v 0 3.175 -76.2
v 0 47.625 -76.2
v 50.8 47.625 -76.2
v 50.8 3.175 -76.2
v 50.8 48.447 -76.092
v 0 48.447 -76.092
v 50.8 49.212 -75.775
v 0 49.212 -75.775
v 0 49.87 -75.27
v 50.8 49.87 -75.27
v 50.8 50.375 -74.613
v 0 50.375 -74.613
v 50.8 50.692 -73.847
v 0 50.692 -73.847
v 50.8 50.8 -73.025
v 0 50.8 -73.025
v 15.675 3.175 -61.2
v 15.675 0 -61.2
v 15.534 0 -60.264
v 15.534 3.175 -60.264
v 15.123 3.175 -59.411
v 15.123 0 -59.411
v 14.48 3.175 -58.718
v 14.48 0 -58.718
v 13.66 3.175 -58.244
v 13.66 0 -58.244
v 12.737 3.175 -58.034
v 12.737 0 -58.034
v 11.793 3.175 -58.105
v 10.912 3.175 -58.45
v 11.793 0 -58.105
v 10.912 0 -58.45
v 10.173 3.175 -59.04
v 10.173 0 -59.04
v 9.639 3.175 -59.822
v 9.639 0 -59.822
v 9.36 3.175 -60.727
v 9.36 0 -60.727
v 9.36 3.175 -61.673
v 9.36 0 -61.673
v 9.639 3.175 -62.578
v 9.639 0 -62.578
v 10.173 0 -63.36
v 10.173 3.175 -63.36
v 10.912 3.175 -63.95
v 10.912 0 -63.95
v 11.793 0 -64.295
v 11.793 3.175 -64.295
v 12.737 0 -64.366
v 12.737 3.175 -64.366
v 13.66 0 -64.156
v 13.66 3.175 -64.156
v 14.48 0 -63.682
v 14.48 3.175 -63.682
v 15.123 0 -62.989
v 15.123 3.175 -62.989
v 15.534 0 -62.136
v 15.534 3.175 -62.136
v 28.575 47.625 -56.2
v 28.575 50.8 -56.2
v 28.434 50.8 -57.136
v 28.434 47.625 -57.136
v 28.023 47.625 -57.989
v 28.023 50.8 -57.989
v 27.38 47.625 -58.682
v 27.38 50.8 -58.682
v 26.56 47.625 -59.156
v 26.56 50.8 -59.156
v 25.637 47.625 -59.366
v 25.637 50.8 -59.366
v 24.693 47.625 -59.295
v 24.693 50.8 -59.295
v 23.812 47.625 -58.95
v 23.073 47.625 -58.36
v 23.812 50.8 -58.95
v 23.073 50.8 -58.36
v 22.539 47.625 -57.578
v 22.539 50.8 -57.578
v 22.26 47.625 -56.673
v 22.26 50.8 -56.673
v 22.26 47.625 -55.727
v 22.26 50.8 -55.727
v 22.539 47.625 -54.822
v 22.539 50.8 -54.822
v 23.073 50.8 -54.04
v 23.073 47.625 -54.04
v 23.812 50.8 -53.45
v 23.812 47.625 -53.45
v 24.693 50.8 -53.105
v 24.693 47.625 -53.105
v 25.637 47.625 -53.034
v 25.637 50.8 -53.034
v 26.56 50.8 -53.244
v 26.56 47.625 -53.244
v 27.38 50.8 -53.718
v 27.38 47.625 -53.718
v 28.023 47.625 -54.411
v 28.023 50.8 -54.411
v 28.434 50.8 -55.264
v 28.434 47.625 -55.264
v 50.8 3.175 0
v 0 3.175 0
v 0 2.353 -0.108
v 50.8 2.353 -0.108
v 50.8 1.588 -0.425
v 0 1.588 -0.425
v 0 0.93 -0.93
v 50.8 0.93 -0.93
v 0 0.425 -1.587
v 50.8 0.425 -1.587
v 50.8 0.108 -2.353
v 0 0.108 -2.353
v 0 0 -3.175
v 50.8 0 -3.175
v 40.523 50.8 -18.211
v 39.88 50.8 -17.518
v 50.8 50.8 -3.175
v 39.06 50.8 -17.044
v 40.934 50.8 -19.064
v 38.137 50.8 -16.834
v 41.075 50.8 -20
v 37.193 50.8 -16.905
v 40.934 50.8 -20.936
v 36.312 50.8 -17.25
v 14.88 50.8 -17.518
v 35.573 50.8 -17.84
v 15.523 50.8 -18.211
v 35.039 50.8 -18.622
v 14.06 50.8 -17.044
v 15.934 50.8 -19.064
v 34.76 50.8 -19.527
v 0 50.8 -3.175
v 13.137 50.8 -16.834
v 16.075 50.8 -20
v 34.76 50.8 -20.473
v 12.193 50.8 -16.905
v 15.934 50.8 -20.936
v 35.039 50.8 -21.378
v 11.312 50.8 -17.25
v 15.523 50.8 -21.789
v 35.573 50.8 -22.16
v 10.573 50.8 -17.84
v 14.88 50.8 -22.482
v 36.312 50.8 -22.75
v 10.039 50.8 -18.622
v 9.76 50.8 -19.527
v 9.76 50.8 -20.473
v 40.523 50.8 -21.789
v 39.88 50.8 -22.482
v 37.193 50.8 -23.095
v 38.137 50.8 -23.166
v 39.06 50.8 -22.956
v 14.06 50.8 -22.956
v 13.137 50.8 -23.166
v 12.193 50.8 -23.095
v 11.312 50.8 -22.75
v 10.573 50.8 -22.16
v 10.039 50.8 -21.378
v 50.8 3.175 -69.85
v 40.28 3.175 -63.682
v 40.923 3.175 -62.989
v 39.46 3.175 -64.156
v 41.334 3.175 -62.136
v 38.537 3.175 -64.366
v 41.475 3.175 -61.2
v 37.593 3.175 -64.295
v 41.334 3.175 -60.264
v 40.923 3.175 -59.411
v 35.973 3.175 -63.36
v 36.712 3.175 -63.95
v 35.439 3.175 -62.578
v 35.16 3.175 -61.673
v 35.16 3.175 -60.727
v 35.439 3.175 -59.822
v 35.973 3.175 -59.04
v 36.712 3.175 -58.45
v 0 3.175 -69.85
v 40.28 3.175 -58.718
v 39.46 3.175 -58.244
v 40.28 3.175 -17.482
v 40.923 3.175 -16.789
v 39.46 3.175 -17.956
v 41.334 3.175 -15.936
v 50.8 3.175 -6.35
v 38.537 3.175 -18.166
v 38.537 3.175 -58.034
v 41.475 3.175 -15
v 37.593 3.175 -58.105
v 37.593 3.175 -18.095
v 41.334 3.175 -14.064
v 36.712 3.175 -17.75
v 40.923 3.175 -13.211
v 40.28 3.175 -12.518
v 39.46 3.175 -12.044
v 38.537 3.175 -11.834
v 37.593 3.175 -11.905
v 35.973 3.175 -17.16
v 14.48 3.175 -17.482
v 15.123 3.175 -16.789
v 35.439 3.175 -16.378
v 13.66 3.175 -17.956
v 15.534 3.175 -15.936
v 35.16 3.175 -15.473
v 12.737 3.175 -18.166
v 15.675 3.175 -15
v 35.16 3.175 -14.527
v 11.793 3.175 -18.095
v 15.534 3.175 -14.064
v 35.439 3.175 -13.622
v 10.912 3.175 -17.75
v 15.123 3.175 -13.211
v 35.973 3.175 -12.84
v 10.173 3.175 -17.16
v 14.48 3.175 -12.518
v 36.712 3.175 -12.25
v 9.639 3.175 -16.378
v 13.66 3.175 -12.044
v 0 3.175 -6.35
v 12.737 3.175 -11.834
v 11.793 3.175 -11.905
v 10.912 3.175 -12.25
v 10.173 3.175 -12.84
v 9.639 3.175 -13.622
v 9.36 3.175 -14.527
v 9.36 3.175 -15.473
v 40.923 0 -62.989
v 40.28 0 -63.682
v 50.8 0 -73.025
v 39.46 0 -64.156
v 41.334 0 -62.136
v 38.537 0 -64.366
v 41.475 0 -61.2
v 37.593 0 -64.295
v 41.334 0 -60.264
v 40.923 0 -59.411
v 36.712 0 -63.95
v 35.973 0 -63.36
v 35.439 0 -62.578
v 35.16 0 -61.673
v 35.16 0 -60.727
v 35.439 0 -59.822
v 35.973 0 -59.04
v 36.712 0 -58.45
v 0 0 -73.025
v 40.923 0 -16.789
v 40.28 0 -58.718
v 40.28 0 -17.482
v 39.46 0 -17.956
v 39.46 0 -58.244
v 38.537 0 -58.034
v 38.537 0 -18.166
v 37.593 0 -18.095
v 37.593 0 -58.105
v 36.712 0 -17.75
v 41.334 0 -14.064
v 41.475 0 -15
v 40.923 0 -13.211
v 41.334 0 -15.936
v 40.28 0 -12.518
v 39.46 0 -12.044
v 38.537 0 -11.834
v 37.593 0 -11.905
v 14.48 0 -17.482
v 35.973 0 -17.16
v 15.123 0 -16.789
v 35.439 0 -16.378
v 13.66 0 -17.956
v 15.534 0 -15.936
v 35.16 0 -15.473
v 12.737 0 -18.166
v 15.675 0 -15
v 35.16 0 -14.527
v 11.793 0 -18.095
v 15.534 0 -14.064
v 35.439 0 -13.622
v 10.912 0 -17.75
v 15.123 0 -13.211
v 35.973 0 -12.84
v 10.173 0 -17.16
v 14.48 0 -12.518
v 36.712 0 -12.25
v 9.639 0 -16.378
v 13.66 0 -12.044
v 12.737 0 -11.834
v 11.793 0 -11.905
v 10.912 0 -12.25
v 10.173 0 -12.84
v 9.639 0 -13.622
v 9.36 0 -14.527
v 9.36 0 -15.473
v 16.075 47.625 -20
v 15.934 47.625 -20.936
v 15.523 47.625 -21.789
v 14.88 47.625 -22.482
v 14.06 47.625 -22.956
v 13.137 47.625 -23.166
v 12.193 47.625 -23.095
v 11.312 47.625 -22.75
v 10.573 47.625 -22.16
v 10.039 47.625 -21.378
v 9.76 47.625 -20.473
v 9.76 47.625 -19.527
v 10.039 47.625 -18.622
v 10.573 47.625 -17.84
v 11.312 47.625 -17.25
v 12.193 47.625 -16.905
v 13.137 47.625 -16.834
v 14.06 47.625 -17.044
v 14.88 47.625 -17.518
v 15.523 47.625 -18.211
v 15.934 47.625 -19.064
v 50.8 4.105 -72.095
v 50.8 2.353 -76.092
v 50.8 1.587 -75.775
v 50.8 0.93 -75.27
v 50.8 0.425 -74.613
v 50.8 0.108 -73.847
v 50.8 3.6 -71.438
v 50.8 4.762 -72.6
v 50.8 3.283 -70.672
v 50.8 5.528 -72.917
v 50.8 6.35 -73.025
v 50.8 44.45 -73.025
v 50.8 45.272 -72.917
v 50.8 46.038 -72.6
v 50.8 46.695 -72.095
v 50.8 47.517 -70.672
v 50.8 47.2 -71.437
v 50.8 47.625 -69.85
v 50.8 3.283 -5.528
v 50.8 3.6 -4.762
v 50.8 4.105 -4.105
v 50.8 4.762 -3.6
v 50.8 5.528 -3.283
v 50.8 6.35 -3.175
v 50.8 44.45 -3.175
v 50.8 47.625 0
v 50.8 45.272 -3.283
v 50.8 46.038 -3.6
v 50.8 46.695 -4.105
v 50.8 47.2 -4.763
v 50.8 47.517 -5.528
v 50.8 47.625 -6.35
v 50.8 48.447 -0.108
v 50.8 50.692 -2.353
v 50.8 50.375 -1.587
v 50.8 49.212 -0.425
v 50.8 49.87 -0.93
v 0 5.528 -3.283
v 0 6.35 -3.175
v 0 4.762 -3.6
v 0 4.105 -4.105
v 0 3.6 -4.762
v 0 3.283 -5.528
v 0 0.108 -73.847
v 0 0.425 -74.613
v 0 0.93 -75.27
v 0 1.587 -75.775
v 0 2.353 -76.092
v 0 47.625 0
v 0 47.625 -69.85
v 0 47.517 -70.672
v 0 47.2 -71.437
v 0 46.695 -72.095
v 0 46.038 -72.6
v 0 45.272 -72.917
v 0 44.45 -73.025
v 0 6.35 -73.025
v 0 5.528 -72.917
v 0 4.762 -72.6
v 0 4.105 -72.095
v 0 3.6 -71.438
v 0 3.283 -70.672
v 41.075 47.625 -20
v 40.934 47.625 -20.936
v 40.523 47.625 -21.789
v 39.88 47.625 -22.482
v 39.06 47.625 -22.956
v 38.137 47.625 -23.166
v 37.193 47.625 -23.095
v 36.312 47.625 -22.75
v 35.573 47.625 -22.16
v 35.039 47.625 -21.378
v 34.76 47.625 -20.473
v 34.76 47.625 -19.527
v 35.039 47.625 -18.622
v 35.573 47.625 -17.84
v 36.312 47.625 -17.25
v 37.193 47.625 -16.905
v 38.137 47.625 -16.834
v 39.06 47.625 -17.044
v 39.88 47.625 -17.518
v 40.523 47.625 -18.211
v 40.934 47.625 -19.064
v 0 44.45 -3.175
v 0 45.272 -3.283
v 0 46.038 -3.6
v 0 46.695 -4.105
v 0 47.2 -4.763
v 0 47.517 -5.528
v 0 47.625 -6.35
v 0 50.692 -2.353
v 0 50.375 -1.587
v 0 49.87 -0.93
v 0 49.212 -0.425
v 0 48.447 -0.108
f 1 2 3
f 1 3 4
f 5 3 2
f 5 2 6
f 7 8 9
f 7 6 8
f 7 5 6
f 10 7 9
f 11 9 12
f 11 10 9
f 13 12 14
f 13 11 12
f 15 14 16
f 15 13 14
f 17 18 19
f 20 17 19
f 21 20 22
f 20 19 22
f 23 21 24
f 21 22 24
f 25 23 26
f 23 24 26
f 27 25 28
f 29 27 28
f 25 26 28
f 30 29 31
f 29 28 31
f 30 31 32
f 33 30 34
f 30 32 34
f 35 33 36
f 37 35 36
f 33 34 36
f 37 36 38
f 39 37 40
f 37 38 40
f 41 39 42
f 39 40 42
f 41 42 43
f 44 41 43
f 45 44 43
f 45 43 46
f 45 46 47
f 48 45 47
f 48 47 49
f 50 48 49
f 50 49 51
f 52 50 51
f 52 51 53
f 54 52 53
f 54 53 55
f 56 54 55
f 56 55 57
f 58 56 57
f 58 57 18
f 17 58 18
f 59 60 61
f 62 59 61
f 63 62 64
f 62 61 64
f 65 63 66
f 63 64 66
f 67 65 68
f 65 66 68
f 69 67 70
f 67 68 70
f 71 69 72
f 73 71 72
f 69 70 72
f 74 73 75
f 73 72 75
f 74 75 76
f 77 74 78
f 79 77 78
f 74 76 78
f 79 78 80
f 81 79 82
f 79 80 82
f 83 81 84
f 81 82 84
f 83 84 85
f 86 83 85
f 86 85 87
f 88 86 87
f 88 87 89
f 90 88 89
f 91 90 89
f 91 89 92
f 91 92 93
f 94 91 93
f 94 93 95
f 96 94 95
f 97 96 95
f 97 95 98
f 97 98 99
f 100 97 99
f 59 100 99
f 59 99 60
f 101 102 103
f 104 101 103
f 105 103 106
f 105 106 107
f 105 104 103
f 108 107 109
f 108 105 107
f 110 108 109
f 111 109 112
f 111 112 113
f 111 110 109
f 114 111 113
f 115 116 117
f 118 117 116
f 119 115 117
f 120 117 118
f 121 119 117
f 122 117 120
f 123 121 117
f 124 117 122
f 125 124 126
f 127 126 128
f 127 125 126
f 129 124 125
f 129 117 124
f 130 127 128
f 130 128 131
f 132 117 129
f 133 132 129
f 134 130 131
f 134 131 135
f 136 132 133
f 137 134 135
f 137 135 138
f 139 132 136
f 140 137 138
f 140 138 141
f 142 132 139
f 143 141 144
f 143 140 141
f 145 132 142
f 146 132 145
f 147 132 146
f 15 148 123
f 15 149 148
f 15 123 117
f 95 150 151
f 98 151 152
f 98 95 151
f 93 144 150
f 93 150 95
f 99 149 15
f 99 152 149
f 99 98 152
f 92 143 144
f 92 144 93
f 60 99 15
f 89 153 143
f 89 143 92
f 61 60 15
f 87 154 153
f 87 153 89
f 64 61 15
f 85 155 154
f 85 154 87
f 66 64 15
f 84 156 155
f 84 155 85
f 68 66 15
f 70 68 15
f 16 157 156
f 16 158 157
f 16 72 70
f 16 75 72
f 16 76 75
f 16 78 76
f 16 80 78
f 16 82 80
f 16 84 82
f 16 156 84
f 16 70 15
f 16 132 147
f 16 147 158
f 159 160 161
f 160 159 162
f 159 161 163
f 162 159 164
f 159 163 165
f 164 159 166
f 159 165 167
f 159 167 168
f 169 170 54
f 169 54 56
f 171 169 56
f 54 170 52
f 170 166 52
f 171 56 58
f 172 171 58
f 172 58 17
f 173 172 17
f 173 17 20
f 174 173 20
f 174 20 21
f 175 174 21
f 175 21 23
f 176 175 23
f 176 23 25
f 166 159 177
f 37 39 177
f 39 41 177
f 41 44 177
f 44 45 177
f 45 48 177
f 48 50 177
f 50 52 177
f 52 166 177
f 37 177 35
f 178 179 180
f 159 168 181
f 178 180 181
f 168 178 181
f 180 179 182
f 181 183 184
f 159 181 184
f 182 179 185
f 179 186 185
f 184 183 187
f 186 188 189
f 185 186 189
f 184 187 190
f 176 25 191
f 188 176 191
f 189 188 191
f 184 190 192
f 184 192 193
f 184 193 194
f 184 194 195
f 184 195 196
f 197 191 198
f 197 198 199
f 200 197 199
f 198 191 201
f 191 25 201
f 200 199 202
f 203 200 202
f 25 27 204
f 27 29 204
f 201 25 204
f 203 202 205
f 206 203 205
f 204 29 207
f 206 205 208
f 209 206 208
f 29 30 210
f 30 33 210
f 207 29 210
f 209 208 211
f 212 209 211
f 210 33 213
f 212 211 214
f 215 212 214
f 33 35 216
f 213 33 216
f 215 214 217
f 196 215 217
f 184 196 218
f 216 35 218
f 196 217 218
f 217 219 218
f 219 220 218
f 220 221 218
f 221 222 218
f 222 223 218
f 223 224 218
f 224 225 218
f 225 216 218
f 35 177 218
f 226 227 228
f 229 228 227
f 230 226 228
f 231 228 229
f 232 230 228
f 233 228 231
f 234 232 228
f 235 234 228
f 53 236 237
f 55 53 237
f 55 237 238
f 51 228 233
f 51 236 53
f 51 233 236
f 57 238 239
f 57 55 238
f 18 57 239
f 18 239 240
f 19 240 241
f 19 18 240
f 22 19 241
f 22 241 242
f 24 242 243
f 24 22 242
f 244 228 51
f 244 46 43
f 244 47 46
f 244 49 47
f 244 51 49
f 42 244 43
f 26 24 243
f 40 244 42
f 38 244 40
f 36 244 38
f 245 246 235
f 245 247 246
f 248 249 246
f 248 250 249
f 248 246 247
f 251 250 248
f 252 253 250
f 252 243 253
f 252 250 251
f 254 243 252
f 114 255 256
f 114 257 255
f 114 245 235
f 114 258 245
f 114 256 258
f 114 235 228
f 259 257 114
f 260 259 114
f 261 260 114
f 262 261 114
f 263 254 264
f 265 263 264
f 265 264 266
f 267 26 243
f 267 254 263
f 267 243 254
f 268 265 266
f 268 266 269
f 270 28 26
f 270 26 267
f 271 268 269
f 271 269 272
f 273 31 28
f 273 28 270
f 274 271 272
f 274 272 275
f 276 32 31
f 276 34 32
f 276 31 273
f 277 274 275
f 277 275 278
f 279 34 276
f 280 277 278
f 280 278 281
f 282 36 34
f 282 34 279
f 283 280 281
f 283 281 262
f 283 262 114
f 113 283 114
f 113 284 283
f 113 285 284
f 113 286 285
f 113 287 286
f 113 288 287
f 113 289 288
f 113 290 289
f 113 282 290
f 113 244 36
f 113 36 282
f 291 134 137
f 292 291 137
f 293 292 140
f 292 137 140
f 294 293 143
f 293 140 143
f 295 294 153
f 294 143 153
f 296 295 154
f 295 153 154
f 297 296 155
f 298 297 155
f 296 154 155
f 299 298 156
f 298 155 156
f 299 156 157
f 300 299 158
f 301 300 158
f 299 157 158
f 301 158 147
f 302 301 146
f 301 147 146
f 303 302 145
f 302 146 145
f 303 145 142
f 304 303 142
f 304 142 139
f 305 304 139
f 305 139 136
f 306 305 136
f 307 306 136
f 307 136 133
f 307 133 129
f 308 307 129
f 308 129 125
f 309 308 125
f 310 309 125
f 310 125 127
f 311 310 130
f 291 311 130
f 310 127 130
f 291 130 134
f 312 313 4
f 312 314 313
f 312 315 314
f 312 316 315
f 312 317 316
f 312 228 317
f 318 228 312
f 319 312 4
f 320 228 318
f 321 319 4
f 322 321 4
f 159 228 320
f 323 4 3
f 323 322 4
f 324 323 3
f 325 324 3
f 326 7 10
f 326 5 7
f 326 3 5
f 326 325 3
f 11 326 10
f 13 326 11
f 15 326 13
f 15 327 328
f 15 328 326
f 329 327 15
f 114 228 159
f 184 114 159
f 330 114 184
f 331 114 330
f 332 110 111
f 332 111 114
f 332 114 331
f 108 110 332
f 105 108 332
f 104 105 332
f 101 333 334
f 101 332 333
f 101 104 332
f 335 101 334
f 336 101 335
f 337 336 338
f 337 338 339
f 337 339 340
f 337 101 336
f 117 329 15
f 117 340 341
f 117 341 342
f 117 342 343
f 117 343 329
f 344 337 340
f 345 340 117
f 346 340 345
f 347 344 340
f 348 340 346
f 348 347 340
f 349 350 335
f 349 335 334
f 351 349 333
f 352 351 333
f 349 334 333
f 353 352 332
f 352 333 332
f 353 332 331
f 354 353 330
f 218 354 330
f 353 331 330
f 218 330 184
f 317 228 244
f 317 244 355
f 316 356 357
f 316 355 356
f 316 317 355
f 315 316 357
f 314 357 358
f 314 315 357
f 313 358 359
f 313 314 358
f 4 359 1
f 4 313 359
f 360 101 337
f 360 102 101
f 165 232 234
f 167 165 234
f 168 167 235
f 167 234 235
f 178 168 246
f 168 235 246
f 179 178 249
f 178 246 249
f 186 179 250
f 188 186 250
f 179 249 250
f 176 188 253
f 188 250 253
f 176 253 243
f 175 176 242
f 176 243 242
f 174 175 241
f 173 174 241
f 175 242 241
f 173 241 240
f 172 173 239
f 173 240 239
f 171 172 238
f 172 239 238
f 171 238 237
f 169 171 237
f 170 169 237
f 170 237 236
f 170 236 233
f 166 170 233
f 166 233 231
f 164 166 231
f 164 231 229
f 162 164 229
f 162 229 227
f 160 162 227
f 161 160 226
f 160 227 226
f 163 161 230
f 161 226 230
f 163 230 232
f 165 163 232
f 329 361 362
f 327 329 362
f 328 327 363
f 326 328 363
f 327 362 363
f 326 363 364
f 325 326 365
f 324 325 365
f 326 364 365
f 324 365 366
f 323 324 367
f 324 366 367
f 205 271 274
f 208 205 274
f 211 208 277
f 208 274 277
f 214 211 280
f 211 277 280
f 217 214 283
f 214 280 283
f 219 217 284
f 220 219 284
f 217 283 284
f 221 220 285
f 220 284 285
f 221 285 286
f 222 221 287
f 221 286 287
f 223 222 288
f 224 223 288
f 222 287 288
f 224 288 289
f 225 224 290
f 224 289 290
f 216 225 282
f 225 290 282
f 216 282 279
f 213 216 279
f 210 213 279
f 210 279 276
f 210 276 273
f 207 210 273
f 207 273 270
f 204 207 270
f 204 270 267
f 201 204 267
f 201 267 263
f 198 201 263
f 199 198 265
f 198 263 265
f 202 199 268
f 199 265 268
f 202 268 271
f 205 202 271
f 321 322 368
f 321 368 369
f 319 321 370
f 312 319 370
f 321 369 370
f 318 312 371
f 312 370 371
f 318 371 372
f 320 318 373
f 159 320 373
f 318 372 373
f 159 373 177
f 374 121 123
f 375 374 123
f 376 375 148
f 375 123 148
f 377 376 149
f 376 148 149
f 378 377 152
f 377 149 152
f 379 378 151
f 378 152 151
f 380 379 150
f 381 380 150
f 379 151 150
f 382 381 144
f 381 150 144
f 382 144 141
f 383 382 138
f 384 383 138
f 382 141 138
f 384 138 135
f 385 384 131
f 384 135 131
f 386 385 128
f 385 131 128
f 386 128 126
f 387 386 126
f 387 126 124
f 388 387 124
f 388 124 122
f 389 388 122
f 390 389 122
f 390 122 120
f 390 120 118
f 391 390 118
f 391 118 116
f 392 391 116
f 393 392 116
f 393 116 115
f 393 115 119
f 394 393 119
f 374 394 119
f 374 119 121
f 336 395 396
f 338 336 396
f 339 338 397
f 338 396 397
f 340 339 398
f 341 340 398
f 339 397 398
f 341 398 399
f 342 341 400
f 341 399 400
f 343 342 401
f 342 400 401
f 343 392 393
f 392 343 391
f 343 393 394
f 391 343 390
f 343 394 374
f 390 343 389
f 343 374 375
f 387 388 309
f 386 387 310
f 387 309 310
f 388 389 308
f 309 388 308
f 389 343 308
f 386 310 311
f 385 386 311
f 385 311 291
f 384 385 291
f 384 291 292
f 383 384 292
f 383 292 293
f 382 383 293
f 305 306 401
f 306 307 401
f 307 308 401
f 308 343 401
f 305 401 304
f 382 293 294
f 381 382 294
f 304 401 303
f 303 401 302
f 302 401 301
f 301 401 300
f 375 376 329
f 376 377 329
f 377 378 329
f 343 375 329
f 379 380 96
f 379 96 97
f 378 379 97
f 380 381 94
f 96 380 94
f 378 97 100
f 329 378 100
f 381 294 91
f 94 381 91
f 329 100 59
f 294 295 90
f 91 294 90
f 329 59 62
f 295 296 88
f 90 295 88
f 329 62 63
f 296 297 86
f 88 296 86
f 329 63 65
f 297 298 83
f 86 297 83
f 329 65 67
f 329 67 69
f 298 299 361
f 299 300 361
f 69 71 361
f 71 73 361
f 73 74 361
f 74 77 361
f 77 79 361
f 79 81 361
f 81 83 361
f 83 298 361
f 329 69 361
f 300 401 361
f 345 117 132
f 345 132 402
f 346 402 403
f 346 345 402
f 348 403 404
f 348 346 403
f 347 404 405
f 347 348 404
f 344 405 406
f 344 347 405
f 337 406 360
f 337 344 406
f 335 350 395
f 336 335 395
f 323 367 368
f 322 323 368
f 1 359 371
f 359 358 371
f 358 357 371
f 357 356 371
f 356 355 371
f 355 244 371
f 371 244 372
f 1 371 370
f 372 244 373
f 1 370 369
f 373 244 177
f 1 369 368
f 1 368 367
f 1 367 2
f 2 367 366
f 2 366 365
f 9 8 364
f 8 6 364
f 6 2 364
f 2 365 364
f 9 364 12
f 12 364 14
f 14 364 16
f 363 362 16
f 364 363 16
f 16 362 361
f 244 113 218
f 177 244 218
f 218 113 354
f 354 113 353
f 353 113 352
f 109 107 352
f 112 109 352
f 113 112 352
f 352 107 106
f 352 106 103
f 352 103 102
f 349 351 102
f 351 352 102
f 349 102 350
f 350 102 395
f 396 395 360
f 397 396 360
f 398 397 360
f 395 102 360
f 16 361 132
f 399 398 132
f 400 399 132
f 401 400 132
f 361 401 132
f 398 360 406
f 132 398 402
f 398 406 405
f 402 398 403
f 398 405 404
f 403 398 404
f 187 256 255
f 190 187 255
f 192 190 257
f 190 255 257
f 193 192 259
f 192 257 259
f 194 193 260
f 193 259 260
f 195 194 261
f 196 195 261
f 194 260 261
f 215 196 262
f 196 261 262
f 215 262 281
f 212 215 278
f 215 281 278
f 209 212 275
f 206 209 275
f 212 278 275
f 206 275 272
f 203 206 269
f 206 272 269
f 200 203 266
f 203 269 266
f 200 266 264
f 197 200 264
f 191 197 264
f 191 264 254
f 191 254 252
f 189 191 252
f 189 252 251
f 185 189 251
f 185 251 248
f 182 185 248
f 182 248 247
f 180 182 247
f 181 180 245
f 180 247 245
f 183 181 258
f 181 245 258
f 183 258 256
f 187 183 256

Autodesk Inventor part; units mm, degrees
ref_plane "YZ Plane" through (0, 0, 0) normal (1, 0, 0) x (0, 1, 0)
ref_plane "XZ Plane" through (0, 0, 0) normal (0, 1, 0) x (-1, 0, 0)
ref_plane "XY Plane" through (0, 0, 0) normal (0, 0, 1) x (1, 0, 0)
sketch "Sketch1" plane through (0, 0, 0) normal (1, 0, 0) x (0, 1, 0)
  line L0 (0, 0) -> (50.8, 0)
  line L1 (50.8, 0) -> (50.8, -76.2)
  line L2 (50.8, -76.2) -> (0, -76.2)
  line L3 (0, -76.2) -> (0, 0)
  dimension "d0" = 76.2
  dimension "d1" = 50.8
extrude "Extrusion1" add sketch "Sketch1" along normal blind 50.8
shell "Shell1" thickness 3.175 removed faces 2 at (0, 33.8667, -50.8) at (50.8, 33.8667, -50.8)
fillet "Fillet1" radius 3.175 8 edges at (25.4, 3.175, -3.175) (25.4, 3.175, -73.025) (25.4, 47.625, -3.175) (25.4, 47.625, -73.025) (25.4, 50.8, 0) (25.4, 0, 0) (25.4, 50.8, -76.2) (25.4, 0, -76.2)
sketch "Sketch2" plane through (0, 0, -73.025) normal (0, -1, 0) x (1, 0, 0)
  circle A0 centre (12.5, 11.825) radius 3.175
  circle A1 centre (12.5, 58.025) radius 3.175
  circle A2 centre (38.3, 11.825) radius 3.175
  circle A3 centre (38.3, 58.025) radius 3.175
  line L0 (12.5, 11.825) -> (38.3, 11.825) construction
  line L1 (38.3, 11.825) -> (38.3, 58.025) construction
  line L2 (38.3, 58.025) -> (12.5, 58.025) construction
  line L3 (12.5, 58.025) -> (12.5, 11.825) construction
  line L4 (0, 73.025) -> (50.8, 73.025) construction
  line L5 (50.8, 73.025) -> (50.8, -3.175) construction
  line L6 (50.8, -3.175) -> (0, -3.175) construction
  line L7 (0, -3.175) -> (0, 73.025) construction
  point P0 (25.4, 58.025)
  point P1 (25.4, 73.025)
  point P2 (12.5, 34.925)
  point P3 (0, 34.925)
  dimension "d6" = 6.35
  dimension "d7" = 50.8
  dimension "d8" = 76.2
  dimension "d10" = 12.5
  dimension "d11" = 15
extrude "Extrusion2" cut sketch "Sketch2" against normal up to surface (3.175 mm away)
sketch "Sketch3" plane through (0, 50.8, -3.175) normal (0, 1, 0) x (1, 0, 0)
  line L0 (0, -3.175) -> (50.8, -3.175) construction
  line L1 (50.8, -3.175) -> (50.8, 73.025) construction
  line L2 (50.8, 73.025) -> (0, 73.025) construction
  line L3 (0, 73.025) -> (0, -3.175) construction
  line L4 (47.625, 73.025) -> (47.625, -3.175) construction
  line L5 (3.175, -3.175) -> (3.175, 73.025) construction
  line L6 (47.625, 34.925) -> (50.8, 34.925) construction
  line L7 (3.175, 34.925) -> (0, 34.925) construction
  line L8 (37.9, 53.025) -> (12.9, 53.025) construction
  line L9 (12.9, 53.025) -> (12.9, 16.825) construction
  line L10 (12.9, 16.825) -> (37.9, 16.825) construction
  line L11 (37.9, 16.825) -> (37.9, 53.025) construction
  circle A0 centre (25.4, 53.025) radius 3.175
  circle A1 centre (12.9, 16.825) radius 3.175
  circle A2 centre (37.9, 16.825) radius 3.175
  line L12 (25.4, 16.825) -> (25.4, -3.175) construction
  line L13 (25.4, 53.025) -> (25.4, 73.025) construction
  dimension "d14" = 3.175
  dimension "d15" = 76.2
  dimension "d16" = 50.8
  dimension "d17" = 6.35
  dimension "d19" = 25
  dimension "d20" = 20
extrude "Extrusion3" cut sketch "Sketch3" against normal up to surface (3.175 mm away)
properties part number "3x2_Bar" material "Steel, Mild"
